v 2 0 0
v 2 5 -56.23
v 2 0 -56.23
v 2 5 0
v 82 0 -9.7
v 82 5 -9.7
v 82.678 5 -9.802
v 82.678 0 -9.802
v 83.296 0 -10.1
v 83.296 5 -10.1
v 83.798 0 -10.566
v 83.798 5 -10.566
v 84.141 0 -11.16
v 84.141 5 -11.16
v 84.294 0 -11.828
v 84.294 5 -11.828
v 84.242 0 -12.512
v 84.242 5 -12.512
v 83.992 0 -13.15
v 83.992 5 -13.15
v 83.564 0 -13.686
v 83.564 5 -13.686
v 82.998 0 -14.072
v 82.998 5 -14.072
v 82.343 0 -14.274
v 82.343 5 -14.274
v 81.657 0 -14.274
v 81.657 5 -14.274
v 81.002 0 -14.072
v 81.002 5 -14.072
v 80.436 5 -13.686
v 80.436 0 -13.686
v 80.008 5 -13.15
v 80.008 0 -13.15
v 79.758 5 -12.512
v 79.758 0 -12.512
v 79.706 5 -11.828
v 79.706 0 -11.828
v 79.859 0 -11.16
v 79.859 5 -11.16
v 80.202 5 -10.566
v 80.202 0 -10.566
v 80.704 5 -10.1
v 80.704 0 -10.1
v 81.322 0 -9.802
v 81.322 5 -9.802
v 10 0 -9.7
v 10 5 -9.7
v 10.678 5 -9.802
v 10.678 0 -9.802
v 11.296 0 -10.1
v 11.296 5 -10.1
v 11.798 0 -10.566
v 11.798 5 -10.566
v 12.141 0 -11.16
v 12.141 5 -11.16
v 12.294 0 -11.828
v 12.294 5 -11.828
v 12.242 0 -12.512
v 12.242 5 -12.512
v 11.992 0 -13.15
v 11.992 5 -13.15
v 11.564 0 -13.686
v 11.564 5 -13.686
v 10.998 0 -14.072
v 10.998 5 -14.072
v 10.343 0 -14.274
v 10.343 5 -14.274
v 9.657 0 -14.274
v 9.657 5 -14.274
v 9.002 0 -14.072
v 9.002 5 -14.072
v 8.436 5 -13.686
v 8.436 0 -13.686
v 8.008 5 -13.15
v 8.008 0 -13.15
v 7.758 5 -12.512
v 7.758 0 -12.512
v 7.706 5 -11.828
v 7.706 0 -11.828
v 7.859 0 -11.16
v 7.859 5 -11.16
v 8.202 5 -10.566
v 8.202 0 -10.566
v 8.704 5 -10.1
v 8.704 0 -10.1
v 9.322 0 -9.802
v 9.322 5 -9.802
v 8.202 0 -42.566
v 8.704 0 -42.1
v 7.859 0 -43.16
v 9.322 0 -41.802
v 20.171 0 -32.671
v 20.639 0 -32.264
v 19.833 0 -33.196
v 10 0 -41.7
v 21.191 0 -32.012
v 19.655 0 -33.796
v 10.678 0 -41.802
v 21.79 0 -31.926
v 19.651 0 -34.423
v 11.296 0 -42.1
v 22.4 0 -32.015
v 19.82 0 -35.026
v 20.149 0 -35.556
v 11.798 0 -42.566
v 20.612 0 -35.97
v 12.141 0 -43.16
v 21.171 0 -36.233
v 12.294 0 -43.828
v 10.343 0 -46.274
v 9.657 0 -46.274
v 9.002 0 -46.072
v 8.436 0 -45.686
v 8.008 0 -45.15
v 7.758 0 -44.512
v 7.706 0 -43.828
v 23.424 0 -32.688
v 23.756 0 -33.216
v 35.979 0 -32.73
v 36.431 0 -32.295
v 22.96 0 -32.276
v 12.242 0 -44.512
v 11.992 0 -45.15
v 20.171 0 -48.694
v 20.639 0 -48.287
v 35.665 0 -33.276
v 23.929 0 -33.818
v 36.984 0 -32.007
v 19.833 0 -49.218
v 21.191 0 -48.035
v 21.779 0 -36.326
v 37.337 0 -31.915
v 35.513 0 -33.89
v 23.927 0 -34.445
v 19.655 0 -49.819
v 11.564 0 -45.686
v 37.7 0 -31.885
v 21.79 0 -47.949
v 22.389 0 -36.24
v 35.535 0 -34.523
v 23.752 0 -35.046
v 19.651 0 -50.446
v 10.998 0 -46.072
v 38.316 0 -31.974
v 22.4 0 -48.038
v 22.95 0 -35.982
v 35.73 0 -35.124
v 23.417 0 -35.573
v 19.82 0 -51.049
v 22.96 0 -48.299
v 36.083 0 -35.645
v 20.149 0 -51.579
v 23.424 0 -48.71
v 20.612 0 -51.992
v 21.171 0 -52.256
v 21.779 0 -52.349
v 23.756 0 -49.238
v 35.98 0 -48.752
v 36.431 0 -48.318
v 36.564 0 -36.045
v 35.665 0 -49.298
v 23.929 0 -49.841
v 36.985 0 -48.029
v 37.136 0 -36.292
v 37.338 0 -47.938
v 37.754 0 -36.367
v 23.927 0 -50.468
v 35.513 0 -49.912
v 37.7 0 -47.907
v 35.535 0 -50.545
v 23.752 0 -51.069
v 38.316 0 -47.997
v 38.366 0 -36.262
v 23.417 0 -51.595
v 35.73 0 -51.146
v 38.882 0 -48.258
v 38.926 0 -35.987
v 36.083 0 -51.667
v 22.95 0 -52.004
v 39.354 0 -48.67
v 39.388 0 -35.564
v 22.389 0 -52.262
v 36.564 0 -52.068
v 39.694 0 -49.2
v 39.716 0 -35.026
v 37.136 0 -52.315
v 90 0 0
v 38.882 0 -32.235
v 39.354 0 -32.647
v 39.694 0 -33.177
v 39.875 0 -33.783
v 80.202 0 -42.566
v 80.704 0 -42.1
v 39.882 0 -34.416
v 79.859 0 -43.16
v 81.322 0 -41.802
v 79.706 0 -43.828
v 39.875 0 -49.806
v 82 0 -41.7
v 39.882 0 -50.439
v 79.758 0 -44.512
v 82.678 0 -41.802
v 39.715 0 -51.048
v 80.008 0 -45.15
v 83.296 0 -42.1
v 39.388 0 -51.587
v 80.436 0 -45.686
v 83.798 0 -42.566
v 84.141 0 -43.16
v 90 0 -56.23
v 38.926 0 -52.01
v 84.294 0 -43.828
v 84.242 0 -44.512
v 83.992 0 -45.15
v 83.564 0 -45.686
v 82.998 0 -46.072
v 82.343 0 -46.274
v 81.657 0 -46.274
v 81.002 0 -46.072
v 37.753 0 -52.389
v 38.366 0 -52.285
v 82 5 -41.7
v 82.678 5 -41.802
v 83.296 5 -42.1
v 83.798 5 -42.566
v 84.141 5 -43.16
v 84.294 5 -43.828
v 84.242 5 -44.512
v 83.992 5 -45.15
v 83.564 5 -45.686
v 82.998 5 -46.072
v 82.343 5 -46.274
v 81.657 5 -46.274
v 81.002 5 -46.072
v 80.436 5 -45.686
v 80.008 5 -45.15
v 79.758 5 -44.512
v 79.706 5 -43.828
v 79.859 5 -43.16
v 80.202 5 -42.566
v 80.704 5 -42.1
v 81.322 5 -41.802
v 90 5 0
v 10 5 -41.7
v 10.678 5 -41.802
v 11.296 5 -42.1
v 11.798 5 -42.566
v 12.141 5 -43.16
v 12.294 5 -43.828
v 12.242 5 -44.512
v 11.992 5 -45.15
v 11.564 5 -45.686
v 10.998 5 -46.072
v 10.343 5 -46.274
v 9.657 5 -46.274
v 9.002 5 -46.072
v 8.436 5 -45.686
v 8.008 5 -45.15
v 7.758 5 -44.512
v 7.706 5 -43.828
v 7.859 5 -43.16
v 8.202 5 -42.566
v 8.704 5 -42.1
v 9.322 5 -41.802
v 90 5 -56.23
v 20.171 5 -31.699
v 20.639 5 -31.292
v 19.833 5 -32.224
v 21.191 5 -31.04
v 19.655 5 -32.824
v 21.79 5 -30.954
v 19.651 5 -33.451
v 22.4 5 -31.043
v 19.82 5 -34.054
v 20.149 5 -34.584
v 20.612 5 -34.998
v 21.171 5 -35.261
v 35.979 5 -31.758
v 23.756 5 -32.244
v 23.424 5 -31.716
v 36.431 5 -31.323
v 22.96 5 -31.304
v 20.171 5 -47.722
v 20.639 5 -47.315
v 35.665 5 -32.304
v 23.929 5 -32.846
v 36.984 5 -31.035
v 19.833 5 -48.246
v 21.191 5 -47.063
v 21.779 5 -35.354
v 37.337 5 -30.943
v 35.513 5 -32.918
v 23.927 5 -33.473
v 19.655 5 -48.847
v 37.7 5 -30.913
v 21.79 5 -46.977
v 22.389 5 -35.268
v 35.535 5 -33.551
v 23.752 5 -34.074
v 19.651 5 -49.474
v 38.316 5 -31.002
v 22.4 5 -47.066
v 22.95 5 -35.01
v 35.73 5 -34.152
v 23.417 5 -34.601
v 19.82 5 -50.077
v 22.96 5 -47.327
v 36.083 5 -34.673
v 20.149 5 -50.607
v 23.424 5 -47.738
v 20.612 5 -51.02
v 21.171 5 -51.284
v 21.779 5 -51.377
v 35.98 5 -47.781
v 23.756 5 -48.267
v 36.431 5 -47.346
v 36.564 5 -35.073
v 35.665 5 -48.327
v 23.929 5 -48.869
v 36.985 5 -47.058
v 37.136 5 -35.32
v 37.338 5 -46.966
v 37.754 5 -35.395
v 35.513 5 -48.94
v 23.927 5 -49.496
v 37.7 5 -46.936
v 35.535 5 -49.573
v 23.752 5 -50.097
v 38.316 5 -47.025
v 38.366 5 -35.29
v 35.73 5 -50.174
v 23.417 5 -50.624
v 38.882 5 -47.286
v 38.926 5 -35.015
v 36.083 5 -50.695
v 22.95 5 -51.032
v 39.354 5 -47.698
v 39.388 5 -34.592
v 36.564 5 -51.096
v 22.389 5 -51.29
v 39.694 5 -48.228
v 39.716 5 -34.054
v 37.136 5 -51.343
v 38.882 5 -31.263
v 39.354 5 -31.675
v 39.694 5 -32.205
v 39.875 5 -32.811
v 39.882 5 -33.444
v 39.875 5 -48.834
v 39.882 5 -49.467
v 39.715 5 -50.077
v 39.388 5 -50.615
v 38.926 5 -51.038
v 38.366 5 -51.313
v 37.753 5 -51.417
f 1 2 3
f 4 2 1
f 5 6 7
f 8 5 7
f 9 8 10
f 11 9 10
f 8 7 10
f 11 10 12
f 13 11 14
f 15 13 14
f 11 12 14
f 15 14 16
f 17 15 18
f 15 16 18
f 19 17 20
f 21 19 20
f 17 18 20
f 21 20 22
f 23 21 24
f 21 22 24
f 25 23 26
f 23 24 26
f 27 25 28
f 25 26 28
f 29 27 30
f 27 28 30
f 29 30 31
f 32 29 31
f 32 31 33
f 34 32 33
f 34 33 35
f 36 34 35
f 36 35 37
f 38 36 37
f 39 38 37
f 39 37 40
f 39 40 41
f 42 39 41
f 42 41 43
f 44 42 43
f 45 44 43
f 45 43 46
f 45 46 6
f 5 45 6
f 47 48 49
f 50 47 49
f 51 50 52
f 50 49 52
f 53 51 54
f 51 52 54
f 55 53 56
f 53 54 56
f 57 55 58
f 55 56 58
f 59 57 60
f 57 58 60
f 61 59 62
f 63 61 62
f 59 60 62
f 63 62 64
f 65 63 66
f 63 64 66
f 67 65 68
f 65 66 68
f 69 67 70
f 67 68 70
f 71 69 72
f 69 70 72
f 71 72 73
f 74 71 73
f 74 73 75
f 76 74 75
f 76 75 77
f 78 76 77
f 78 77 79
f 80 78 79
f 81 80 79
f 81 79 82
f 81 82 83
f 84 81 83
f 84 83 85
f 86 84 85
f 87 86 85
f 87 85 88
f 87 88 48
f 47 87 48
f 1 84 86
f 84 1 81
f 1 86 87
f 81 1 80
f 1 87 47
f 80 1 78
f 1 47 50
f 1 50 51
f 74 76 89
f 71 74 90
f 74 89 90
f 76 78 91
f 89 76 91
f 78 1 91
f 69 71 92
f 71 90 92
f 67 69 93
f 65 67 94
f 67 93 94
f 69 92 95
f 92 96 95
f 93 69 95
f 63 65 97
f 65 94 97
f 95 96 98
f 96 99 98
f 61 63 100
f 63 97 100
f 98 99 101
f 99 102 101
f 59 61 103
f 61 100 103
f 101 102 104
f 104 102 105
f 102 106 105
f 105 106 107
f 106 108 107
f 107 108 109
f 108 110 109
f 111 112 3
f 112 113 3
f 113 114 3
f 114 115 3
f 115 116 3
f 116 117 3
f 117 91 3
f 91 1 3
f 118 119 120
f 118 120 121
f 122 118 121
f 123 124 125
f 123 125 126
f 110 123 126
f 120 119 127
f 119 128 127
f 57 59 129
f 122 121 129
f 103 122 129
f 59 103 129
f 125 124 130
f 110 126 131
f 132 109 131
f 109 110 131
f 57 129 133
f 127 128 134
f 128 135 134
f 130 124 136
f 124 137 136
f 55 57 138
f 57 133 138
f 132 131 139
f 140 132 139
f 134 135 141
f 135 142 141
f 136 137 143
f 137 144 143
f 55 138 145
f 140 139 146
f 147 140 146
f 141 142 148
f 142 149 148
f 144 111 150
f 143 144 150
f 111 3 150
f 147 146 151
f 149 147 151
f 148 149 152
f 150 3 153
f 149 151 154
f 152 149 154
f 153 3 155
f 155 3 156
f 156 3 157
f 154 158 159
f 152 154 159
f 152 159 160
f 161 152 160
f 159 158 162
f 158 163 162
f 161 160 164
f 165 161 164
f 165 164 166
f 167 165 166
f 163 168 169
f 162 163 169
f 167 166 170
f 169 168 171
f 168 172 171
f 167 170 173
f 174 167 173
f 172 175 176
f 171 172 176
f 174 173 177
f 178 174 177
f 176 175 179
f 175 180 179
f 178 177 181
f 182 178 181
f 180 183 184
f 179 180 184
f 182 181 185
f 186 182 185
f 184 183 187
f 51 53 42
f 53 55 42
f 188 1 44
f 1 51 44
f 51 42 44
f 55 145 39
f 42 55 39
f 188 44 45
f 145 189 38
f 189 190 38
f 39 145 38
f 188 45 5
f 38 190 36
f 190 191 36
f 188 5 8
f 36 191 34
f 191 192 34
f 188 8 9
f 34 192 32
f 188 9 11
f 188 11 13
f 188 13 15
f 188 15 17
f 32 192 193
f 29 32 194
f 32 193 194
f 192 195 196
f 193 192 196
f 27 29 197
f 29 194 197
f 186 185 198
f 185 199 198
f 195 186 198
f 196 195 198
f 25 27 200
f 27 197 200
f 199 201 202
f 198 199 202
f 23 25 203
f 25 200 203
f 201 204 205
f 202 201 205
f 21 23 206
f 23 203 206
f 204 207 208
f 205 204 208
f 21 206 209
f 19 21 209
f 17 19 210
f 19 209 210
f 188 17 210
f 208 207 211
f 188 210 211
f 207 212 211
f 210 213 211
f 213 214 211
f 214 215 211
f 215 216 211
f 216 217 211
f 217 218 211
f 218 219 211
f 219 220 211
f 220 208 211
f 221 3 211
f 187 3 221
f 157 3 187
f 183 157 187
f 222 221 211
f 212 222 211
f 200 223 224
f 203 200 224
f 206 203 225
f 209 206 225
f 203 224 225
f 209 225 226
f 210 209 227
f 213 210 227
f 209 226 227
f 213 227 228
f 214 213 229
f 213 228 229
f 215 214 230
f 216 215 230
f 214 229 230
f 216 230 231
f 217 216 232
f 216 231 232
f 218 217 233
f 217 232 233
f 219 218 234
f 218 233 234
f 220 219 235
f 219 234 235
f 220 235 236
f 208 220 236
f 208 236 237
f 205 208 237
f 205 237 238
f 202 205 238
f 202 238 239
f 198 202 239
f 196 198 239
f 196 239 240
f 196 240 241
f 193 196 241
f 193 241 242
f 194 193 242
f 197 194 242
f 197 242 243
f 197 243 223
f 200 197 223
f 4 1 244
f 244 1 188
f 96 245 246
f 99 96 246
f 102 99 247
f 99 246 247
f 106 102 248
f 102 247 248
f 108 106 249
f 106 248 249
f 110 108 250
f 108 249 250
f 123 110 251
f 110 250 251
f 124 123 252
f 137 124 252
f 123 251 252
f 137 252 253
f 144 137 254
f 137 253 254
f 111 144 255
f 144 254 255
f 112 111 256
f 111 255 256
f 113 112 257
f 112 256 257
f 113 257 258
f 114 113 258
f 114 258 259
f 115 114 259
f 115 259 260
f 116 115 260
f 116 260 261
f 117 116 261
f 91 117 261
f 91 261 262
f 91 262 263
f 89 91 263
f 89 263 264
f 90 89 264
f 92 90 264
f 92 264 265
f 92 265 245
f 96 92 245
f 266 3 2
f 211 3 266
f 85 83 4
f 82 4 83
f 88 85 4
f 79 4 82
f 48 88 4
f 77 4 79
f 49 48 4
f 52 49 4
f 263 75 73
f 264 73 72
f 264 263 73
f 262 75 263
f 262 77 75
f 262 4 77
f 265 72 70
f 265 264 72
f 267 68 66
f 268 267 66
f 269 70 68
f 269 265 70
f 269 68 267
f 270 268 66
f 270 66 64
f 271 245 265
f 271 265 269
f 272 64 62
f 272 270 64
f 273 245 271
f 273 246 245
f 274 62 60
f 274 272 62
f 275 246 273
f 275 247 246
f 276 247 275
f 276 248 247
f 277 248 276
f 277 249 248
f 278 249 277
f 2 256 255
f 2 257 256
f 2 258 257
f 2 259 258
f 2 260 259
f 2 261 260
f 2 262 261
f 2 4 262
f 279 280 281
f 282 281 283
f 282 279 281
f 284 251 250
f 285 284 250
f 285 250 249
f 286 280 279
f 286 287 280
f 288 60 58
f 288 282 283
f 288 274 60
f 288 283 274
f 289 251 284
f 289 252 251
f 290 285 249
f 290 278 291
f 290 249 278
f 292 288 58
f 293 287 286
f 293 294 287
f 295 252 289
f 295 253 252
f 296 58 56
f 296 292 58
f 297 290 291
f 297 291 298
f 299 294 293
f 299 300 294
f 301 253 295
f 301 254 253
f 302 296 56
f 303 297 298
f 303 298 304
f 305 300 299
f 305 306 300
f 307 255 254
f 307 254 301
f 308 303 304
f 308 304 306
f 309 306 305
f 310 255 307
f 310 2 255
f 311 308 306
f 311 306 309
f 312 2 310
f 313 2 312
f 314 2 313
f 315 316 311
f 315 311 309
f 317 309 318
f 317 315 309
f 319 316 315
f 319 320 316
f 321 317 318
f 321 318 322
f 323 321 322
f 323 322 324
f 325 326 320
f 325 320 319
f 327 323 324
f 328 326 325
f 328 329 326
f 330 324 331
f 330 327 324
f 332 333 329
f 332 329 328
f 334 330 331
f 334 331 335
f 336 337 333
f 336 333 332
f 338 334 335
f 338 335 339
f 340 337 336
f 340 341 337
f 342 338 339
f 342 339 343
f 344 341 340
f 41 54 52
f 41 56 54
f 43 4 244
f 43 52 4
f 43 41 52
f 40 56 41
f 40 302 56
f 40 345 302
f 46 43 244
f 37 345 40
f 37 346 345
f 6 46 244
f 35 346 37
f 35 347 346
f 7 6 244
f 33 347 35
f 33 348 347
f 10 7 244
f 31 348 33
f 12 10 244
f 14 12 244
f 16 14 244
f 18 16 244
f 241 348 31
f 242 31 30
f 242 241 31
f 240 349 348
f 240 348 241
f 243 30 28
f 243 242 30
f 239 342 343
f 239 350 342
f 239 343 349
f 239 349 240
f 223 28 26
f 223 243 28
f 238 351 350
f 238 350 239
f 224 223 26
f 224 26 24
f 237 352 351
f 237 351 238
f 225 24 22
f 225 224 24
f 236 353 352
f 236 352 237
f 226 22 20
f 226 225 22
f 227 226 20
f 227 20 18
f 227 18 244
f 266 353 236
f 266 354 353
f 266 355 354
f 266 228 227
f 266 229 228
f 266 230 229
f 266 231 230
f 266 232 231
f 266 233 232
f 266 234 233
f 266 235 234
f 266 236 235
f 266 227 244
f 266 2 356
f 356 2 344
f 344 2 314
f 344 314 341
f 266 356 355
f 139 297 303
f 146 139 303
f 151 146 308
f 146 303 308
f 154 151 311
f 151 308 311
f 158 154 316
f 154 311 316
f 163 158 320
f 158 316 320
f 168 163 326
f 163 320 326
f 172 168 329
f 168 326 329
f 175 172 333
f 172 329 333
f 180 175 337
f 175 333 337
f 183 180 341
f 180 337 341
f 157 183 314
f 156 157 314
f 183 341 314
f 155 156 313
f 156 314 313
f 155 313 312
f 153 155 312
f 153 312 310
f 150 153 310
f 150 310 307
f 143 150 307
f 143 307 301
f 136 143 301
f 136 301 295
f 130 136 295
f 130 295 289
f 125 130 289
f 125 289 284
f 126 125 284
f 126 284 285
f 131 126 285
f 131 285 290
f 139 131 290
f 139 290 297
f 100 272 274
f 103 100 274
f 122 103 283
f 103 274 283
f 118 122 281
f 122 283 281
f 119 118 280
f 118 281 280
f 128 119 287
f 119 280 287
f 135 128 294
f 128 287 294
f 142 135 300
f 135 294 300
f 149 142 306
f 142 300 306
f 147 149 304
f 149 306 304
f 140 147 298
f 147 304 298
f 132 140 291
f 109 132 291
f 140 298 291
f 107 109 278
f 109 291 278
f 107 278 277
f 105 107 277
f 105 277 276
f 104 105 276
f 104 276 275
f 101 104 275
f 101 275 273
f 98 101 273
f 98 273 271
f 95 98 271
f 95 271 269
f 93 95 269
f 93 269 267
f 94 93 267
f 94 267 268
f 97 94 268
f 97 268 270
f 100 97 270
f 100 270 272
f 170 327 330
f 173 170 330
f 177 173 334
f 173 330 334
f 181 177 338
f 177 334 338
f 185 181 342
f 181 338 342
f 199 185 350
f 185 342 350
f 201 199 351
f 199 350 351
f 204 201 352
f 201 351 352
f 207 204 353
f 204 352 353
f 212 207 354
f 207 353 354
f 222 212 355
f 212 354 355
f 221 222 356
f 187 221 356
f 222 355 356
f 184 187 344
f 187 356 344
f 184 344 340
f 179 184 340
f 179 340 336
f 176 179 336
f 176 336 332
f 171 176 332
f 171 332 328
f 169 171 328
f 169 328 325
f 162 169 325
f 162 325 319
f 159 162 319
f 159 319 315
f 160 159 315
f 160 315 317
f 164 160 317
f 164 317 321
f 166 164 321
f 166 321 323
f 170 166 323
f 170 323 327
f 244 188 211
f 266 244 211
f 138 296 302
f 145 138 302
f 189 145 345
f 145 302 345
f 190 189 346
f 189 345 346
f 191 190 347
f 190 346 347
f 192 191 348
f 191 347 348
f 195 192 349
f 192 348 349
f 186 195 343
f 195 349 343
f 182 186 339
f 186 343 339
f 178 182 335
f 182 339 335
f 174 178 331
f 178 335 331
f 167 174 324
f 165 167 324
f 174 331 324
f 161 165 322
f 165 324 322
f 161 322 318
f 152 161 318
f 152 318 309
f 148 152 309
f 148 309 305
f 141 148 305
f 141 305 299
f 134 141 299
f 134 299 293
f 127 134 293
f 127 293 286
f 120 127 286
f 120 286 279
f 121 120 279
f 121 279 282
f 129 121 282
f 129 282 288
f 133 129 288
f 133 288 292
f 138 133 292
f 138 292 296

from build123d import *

# Parameters (mm, degrees)
SKETCH1_W           = 90
SKETCH1_H           = 56.23
BOSS_EXTRUDE1_DEPTH = 5
SKETCH2_R           = 2.3
CUT_EXTRUDE1_DEPTH  = 15
SKETCH7_R           = 2.3
CUT_EXTRUDE3_DEPTH  = 45
SKETCH9_W           = 61.183864123
SKETCH9_H           = 5.04390519
CUT_EXTRUDE4_DEPTH  = 2
SKETCH11_R          = 2.159579804
SKETCH11_R_2        = 2.2
SKETCH11_R_3        = 2.200145532
CUT_EXTRUDE5_DEPTH  = 20


with BuildPart() as part:
    # Sketch1 → Boss-Extrude1 (new body)
    with BuildSketch(Plane(origin=(0, 0, 0), x_dir=(1, 0, 0), z_dir=(0, 1, 0))):
        with Locations((45, 28.115)):
            Rectangle(SKETCH1_W, SKETCH1_H)
    extrude(amount=BOSS_EXTRUDE1_DEPTH)

    # Sketch2 → Cut-Extrude1 (cut)
    with BuildSketch(Plane(origin=(0, 5, 0), x_dir=(1, 0, 0), z_dir=(0, 1, 0))):
        with Locations(Location((82, 12, 0), (0, 0, 270))):
            Circle(SKETCH2_R)
        with Locations(Location((10, 12, 0), (0, 0, 270))):
            Circle(SKETCH2_R)
    extrude(amount=-CUT_EXTRUDE1_DEPTH, mode=Mode.SUBTRACT)

    # Sketch7 → Cut-Extrude3 (cut)
    with BuildSketch(Plane(origin=(0, 5, 0), x_dir=(1, 0, 0), z_dir=(0, 1, 0))):
        with Locations(Location((82, 44, 0), (0, 0, 270))):
            Circle(SKETCH7_R)
        with Locations(Location((10, 44, 0), (0, 0, 270))):
            Circle(SKETCH7_R)
    extrude(amount=-CUT_EXTRUDE3_DEPTH, mode=Mode.SUBTRACT)

    # Sketch9 → Cut-Extrude4 (cut)
    with BuildSketch(Plane.ZY):
        with Locations((-25.638067939, 2.521952595)):
            Rectangle(SKETCH9_W, SKETCH9_H)
    extrude(amount=-CUT_EXTRUDE4_DEPTH, mode=Mode.SUBTRACT)

    # Sketch11 → Cut-Extrude5 (cut)
    with BuildSketch(Plane(origin=(0, 4.817959636, 0.936516484), x_dir=(1, 0, 0), z_dir=(0, 0.9816271834476639, 0.19080899537654525))):
        with Locations(Location((21.790317182, 49.227295285, 0), (0, 0, 270))):
            Circle(SKETCH11_R)
        with Locations(Location((37.700491288, 49.227295285, 0), (0, 0, 270))):
            Circle(SKETCH11_R_2)
        with Locations(Location((37.700491288, 33.498951741, 0), (0, 0, 270))):
            Circle(SKETCH11_R_3)
        with Locations(Location((21.790317182, 33.498951741, 0), (0, 0, 270))):
            Circle(SKETCH11_R)
    extrude(amount=-CUT_EXTRUDE5_DEPTH, mode=Mode.SUBTRACT)


solid = part.part
